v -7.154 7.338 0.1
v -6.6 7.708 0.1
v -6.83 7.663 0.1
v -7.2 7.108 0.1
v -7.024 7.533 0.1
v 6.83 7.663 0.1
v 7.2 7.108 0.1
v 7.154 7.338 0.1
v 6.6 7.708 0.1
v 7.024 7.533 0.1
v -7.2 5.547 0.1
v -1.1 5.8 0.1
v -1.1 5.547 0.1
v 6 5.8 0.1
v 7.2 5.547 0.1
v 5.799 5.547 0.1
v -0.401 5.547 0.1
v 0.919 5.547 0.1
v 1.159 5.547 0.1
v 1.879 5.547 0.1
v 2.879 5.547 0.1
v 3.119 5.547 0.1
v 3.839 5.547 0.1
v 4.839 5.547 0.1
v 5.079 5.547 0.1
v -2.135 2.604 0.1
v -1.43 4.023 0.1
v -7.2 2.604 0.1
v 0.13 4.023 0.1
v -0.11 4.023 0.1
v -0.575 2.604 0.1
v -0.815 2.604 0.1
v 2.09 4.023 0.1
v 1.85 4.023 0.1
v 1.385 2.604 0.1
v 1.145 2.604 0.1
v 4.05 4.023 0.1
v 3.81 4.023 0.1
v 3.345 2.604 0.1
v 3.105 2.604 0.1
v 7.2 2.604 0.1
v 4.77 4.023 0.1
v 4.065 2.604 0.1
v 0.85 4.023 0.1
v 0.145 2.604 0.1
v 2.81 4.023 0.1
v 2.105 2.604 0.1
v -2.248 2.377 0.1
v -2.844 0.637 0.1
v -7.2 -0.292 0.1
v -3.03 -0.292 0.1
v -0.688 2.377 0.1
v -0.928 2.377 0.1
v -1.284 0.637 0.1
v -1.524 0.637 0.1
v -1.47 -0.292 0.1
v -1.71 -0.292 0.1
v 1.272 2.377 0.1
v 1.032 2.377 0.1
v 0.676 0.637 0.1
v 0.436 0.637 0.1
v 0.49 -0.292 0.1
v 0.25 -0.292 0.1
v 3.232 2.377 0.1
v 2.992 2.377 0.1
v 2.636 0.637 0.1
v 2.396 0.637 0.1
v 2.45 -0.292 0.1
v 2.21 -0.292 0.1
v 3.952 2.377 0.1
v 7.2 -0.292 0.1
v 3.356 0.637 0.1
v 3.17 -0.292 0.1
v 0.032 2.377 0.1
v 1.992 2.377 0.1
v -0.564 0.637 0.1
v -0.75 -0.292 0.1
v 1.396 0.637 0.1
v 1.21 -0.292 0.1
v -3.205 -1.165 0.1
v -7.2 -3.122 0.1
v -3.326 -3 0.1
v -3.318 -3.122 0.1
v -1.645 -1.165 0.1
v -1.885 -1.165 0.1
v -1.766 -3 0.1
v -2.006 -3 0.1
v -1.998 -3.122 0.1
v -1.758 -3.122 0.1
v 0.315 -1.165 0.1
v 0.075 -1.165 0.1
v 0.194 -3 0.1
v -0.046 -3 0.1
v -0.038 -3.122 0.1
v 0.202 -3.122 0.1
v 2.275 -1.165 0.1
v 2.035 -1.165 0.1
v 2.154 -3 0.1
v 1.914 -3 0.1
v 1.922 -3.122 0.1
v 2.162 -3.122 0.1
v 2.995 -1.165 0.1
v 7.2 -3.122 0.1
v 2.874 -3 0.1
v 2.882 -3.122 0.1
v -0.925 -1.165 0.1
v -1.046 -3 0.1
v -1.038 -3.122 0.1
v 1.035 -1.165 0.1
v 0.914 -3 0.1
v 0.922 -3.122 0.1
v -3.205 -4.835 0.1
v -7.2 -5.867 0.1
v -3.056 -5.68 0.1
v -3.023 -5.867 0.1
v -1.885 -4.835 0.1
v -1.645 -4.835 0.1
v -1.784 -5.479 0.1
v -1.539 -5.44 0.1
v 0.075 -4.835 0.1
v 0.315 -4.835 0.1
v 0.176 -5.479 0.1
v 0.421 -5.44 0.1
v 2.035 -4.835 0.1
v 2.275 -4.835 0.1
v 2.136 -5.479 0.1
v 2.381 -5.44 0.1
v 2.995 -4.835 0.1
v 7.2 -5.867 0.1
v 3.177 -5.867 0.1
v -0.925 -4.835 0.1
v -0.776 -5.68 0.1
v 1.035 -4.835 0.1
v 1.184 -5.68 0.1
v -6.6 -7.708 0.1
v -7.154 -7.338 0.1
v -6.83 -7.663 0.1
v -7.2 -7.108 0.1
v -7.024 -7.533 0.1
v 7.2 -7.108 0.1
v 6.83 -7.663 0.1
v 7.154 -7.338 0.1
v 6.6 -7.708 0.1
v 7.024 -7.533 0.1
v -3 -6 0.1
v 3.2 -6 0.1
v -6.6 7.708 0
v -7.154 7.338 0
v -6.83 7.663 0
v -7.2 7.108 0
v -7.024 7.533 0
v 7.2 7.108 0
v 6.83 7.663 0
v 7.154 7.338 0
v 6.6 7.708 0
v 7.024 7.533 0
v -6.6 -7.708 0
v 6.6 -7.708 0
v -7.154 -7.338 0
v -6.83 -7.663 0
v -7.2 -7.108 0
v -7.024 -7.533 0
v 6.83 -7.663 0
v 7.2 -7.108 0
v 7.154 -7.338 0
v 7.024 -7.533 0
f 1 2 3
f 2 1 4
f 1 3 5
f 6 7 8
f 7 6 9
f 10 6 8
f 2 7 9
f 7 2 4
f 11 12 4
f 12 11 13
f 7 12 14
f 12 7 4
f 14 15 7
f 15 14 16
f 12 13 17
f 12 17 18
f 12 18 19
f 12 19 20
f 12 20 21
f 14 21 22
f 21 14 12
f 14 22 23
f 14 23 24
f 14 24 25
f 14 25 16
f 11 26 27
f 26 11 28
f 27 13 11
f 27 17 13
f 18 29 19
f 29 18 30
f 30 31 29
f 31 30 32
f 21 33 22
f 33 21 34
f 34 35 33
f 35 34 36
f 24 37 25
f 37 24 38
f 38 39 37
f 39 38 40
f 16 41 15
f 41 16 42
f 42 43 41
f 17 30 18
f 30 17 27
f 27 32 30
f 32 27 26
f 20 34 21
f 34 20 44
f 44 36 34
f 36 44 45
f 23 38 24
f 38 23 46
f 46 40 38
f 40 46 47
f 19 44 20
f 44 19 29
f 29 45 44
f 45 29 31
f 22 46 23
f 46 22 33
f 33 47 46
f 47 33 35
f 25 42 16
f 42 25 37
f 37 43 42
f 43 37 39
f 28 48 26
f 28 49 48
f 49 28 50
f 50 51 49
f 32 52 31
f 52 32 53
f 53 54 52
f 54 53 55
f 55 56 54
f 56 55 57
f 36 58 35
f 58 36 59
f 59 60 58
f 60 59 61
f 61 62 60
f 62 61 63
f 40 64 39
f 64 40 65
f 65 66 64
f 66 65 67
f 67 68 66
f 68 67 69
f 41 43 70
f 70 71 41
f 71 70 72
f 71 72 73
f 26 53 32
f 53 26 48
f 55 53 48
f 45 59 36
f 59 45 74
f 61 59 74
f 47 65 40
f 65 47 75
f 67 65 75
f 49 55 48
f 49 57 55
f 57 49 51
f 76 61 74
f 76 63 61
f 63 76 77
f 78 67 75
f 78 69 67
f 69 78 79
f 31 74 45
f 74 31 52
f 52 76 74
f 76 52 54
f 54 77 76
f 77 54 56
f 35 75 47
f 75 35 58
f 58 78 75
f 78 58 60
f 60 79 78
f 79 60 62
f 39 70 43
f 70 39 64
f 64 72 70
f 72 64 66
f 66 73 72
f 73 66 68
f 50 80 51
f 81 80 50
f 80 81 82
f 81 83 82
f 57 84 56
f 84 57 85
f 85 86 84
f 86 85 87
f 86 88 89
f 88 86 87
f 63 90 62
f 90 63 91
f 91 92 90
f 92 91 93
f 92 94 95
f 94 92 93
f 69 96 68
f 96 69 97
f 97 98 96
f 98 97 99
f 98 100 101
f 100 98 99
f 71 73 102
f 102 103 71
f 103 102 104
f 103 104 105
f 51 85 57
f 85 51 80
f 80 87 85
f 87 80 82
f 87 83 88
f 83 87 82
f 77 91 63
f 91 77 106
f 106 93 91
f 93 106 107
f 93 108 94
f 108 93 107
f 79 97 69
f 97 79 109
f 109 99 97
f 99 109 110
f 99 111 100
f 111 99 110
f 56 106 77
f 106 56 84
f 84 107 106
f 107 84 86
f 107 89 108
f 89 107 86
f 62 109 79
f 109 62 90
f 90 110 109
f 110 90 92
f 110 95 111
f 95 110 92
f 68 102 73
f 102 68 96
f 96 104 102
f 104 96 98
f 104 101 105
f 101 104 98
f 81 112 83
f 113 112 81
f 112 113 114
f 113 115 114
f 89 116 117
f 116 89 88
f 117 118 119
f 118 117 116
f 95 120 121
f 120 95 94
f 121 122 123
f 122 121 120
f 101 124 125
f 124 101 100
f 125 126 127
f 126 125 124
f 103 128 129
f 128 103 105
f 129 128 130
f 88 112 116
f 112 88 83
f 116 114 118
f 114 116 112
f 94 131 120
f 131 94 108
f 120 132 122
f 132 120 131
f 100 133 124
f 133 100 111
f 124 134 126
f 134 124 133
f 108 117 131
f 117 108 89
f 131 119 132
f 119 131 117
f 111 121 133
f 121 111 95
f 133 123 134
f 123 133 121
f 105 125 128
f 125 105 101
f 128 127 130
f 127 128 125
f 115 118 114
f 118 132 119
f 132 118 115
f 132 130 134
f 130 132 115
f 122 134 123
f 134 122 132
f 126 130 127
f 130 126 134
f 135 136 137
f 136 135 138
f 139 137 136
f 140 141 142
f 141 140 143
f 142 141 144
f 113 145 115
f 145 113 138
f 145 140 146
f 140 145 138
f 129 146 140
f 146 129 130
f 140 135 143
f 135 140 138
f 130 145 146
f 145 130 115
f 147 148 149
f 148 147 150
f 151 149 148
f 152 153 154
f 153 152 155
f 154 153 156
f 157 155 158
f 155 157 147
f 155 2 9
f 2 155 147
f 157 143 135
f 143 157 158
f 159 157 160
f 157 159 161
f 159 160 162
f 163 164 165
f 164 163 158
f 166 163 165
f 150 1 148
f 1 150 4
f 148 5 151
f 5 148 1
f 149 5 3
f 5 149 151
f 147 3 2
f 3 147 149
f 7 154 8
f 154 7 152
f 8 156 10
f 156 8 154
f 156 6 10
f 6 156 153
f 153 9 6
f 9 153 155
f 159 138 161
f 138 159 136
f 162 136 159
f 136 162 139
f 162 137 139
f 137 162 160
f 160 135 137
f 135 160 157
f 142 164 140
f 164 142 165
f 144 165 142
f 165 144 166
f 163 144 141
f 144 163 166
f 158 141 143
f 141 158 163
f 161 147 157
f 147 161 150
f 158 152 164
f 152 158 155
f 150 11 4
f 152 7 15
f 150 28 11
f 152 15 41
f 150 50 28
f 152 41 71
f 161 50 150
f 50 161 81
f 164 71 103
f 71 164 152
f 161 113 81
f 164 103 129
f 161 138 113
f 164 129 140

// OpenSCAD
// file: ../p/box3u12.scad
use <../lib.scad>
function ldraw_lib__box3u12() = [
// 0 Box with 3 Parallel Faces without Any Edges
// 0 Name: box3u12.dat
// 0 Author: J.C. Tchang [tchang]
// 0 !LDRAW_ORG Primitive UPDATE 2014-02
// 0 !LICENSE Licensed under CC BY 4.0 : see CAreadme.txt
// 
// 0 BFC CERTIFY CCW
  [0,"BFC","CERTIFY"],
  [0,"BFC","CCW"],
// 
// 0 !HISTORY 2014-12-23 [PTadmin] Official Update 2014-02
// 
// 
// 4 16 -1 1 1 1 1 1 1 1 -1 -1 1 -1
  [4,16,-1,1,1,1,1,1,1,1,-1,-1,1,-1],
// 4 16 -1 1 1 -1 0 1 1 0 1 1 1 1
  [4,16,-1,1,1,-1,0,1,1,0,1,1,1,1],
// 4 16 1 1 -1 1 0 -1 -1 0 -1 -1 1 -1
  [4,16,1,1,-1,1,0,-1,-1,0,-1,-1,1,-1],
];
module ldraw_lib__box3u12(step=0, col=false, unit=2/5, alt=false, line=0.2, solid=!$preview)
    makepoly(ldraw_lib__box3u12(), step=step, col=col, unit=unit, alt=alt, line=line, solid=solid);
ldraw_lib__box3u12(line=0.2);
// file: ../p/1-4cyli.scad
use <../lib.scad>
function ldraw_lib__1_4cyli() = [
// 0 Cylinder 0.25
// 0 Name: 1-4cyli.dat
// 0 Author: James Jessiman
// 0 !LDRAW_ORG Primitive UPDATE 2012-01
// 0 !LICENSE Licensed under CC BY 4.0 : see CAreadme.txt
// 
// 0 BFC CERTIFY CCW
  [0,"BFC","CERTIFY"],
  [0,"BFC","CCW"],
// 
// 0 !HISTORY 2002-03-23 [sbliss] Added BFC statement.
// 0 !HISTORY 2002-04-25 [PTadmin] Official Update 2002-02
// 0 !HISTORY 2007-06-22 [PTadmin] Header formatted for Contributor Agreement
// 0 !HISTORY 2008-07-01 [PTadmin] Official Update 2008-01
// 0 !HISTORY 2012-02-16 [Philo] Changed to CCW
// 0 !HISTORY 2012-03-30 [PTadmin] Official Update 2012-01
// 
// 
// 4 16 1 1 0 0.9239 1 0.3827 0.9239 0 0.3827 1 0 0
  [4,16,1,1,0,0.9239,1,0.3827,0.9239,0,0.3827,1,0,0],
// 5 24 1 0 0 1 1 0 0.9239 0 0.3827 1 0 -1
  [5,24,1,0,0,1,1,0,0.9239,0,0.3827,1,0,-1],
// 4 16 0.9239 1 0.3827 0.7071 1 0.7071 0.7071 0 0.7071 0.9239 0 0.3827
  [4,16,0.9239,1,0.3827,0.7071,1,0.7071,0.7071,0,0.7071,0.9239,0,0.3827],
// 5 24 0.9239 0 0.3827 0.9239 1 0.3827 0.7071 0 0.7071 1 0 0
  [5,24,0.9239,0,0.3827,0.9239,1,0.3827,0.7071,0,0.7071,1,0,0],
// 4 16 0.7071 1 0.7071 0.3827 1 0.9239 0.3827 0 0.9239 0.7071 0 0.7071
  [4,16,0.7071,1,0.7071,0.3827,1,0.9239,0.3827,0,0.9239,0.7071,0,0.7071],
// 5 24 0.7071 0 0.7071 0.7071 1 0.7071 0.3827 0 0.9239 0.9239 0 0.3827
  [5,24,0.7071,0,0.7071,0.7071,1,0.7071,0.3827,0,0.9239,0.9239,0,0.3827],
// 4 16 0.3827 1 0.9239 0 1 1 0 0 1 0.3827 0 0.9239
  [4,16,0.3827,1,0.9239,0,1,1,0,0,1,0.3827,0,0.9239],
// 5 24 0.3827 0 0.9239 0.3827 1 0.9239 0 0 1 0.7071 0 0.7071
  [5,24,0.3827,0,0.9239,0.3827,1,0.9239,0,0,1,0.7071,0,0.7071],
// 5 24 0 0 1 0 1 1 0.3827 0 0.9239 -1 0 1
  [5,24,0,0,1,0,1,1,0.3827,0,0.9239,-1,0,1],
];
module ldraw_lib__1_4cyli(step=0, col=false, unit=2/5, alt=false, line=0.2, solid=!$preview)
    makepoly(ldraw_lib__1_4cyli(), step=step, col=col, unit=unit, alt=alt, line=line, solid=solid);
ldraw_lib__1_4cyli(line=0.2);
// file: ../p/1-4chrd.scad
use <../lib.scad>
function ldraw_lib__1_4chrd() = [
// 0 Chord 0.25
// 0 Name: 1-4chrd.dat
// 0 Author: Max Martin Richter [MMR1988]
// 0 !LDRAW_ORG Primitive UPDATE 2023-05
// 0 !LICENSE Licensed under CC BY 4.0 : see CAreadme.txt
// 
// 0 BFC CERTIFY CCW
  [0,"BFC","CERTIFY"],
  [0,"BFC","CCW"],
// 
// 0 !HISTORY 2004-04-22 [PTadmin] Official Update 2004-02
// 0 !HISTORY 2007-10-09 [PTadmin] Header formatted for Contributor Agreement
// 0 !HISTORY 2008-07-01 [PTadmin] Official Update 2008-01
// 0 !HISTORY 2012-08-02 [MMR1988] Re-creation with PrimGen2 and Rectifier
// 0 !HISTORY 2012-08-09 [PTadmin] Official Update 2012-02
// 0 !HISTORY 2023-10-27 [OrionP] Change author to MMR1988 from hafhead
// 0 !HISTORY 2023-10-31 [OrionP] Official Update 2023-05
// 
// 4 16 0.9239 0 0.3827 0.3827 0 0.9239 0 0 1 1 0 0
  [4,16,0.9239,0,0.3827,0.3827,0,0.9239,0,0,1,1,0,0],
// 3 16 0.7071 0 0.7071 0.3827 0 0.9239 0.9239 0 0.3827
  [3,16,0.7071,0,0.7071,0.3827,0,0.9239,0.9239,0,0.3827],
];
module ldraw_lib__1_4chrd(step=0, col=false, unit=2/5, alt=false, line=0.2, solid=!$preview)
    makepoly(ldraw_lib__1_4chrd(), step=step, col=col, unit=unit, alt=alt, line=line, solid=solid);
ldraw_lib__1_4chrd(line=0.2);
// file: s/6142617ss07.scad
use <../../lib.scad>
use <../../p/1-4chrd.scad>
use <../../p/1-4cyli.scad>
use <../../p/box3u12.scad>
function ldraw_lib__s__6142617ss07() = [
// 0 ~Sticker  1.9 x  1.8 with Silver Air Vents on Black Background Left - Bottom Face
// 0 Name: s\6142617ss07.dat
// 0 Author: Massimo Maso [Sirio]
// 0 !LDRAW_ORG Subpart UPDATE 2023-05
// 0 !LICENSE Licensed under CC BY 4.0 : see CAreadme.txt
// 
// 0 BFC CERTIFY CCW
  [0,"BFC","CERTIFY"],
  [0,"BFC","CCW"],
// 
// 0 !HISTORY 2023-10-31 [OrionP] Official Update 2023-05
// 
// 
// 0 // Primitives
// 1 16 -16.5 0 17.7711 -1.5 0 0 0 -1 0 0 0 1.5 1-4chrd.dat
  [1,16,-16.5,0,17.7711,-1.5,0,0,0,-1,0,0,0,1.5, ldraw_lib__1_4chrd()],
// 1 16 16.5 0 17.7711 1.5 0 0 0 -1 0 0 0 1.5 1-4chrd.dat
  [1,16,16.5,0,17.7711,1.5,0,0,0,-1,0,0,0,1.5, ldraw_lib__1_4chrd()],
// 1 16 0 -.25 0 16.5 0 0 0 .25 0 0 0 19.2711 box3u12.dat
  [1,16,0,-.25,0,16.5,0,0,0,.25,0,0,0,19.2711, ldraw_lib__box3u12()],
// 1 16 -16.5 0 -17.7711 -1.5 0 0 0 -1 0 0 0 -1.5 1-4chrd.dat
  [1,16,-16.5,0,-17.7711,-1.5,0,0,0,-1,0,0,0,-1.5, ldraw_lib__1_4chrd()],
// 1 16 16.5 0 -17.7711 1.5 0 0 0 -1 0 0 0 -1.5 1-4chrd.dat
  [1,16,16.5,0,-17.7711,1.5,0,0,0,-1,0,0,0,-1.5, ldraw_lib__1_4chrd()],
// 1 16 -16.5 -0.25 17.7711 -1.5 0 0 0 0.25 0 0 0 1.5 1-4cyli.dat
  [1,16,-16.5,-0.25,17.7711,-1.5,0,0,0,0.25,0,0,0,1.5, ldraw_lib__1_4cyli()],
// 1 16 16.5 -0.25 17.7711 1.5 0 0 0 0.25 0 0 0 1.5 1-4cyli.dat
  [1,16,16.5,-0.25,17.7711,1.5,0,0,0,0.25,0,0,0,1.5, ldraw_lib__1_4cyli()],
// 1 16 -16.5 -0.25 -17.7711 -1.5 0 0 0 0.25 0 0 0 -1.5 1-4cyli.dat
  [1,16,-16.5,-0.25,-17.7711,-1.5,0,0,0,0.25,0,0,0,-1.5, ldraw_lib__1_4cyli()],
// 1 16 16.5 -0.25 -17.7711 1.5 0 0 0 0.25 0 0 0 -1.5 1-4cyli.dat
  [1,16,16.5,-0.25,-17.7711,1.5,0,0,0,0.25,0,0,0,-1.5, ldraw_lib__1_4cyli()],
// 0 // Bottom face
// 4 16 -16.5 0 19.2711 -16.5 0 -19.2711 -18 0 -17.7711 -18 0 17.7711
  [4,16,-16.5,0,19.2711,-16.5,0,-19.2711,-18,0,-17.7711,-18,0,17.7711],
// 4 16 16.5 0 19.2711 18 0 17.7711 18 0 -17.7711 16.5 0 -19.2711
  [4,16,16.5,0,19.2711,18,0,17.7711,18,0,-17.7711,16.5,0,-19.2711],
// 0 // Lateral face
// 3 16 -18 0 17.7711 -18 -.25 13.8668 -18 -.25 17.7711
  [3,16,-18,0,17.7711,-18,-.25,13.8668,-18,-.25,17.7711],
// 3 16 18 0 17.7711 18 -.25 17.7711 18 -.25 13.8668
  [3,16,18,0,17.7711,18,-.25,17.7711,18,-.25,13.8668],
// 3 16 -18 0 17.7711 -18 -.25 6.5112 -18 -.25 13.8668
  [3,16,-18,0,17.7711,-18,-.25,6.5112,-18,-.25,13.8668],
// 3 16 18 0 17.7711 18 -.25 13.8668 18 -.25 6.5112
  [3,16,18,0,17.7711,18,-.25,13.8668,18,-.25,6.5112],
// 3 16 -18 0 17.7711 -18 -.25 -.73 -18 -.25 6.5112
  [3,16,-18,0,17.7711,-18,-.25,-.73,-18,-.25,6.5112],
// 3 16 18 0 17.7711 18 -.25 6.5112 18 -.25 -.73
  [3,16,18,0,17.7711,18,-.25,6.5112,18,-.25,-.73],
// 4 16 -18 0 17.7711 -18 0 -17.7711 -18 -.25 -7.8038 -18 -.25 -.73
  [4,16,-18,0,17.7711,-18,0,-17.7711,-18,-.25,-7.8038,-18,-.25,-.73],
// 4 16 18 0 17.7711 18 -.25 -.73 18 -.25 -7.8038 18 0 -17.7711
  [4,16,18,0,17.7711,18,-.25,-.73,18,-.25,-7.8038,18,0,-17.7711],
// 3 16 -18 0 -17.7711 -18 -.25 -14.6666 -18 -.25 -7.8038
  [3,16,-18,0,-17.7711,-18,-.25,-14.6666,-18,-.25,-7.8038],
// 3 16 18 0 -17.7711 18 -.25 -7.8038 18 -.25 -14.6666
  [3,16,18,0,-17.7711,18,-.25,-7.8038,18,-.25,-14.6666],
// 3 16 -18 0 -17.7711 -18 -.25 -17.7711 -18 -.25 -14.6666
  [3,16,-18,0,-17.7711,-18,-.25,-17.7711,-18,-.25,-14.6666],
// 3 16 18 0 -17.7711 18 -.25 -14.6666 18 -.25 -17.7711
  [3,16,18,0,-17.7711,18,-.25,-14.6666,18,-.25,-17.7711],
];
module ldraw_lib__s__6142617ss07(step=0, col=false, unit=2/5, alt=false, line=0.2, solid=!$preview)
    makepoly(ldraw_lib__s__6142617ss07(), step=step, col=col, unit=unit, alt=alt, line=line, solid=solid);
ldraw_lib__s__6142617ss07(line=0.2);
// file: s/6142617ss06.scad
use <../../lib.scad>
use <../../p/1-4chrd.scad>
function ldraw_lib__s__6142617ss06() = [
// 0 ~Sticker  1.9 x  1.8 with Silver Air Vents on Black Background Left - Sixth Face
// 0 Name: s\6142617ss06.dat
// 0 Author: Massimo Maso [Sirio]
// 0 !LDRAW_ORG Subpart UPDATE 2023-05
// 0 !LICENSE Licensed under CC BY 4.0 : see CAreadme.txt
// 
// 0 BFC CERTIFY CCW
  [0,"BFC","CERTIFY"],
  [0,"BFC","CCW"],
// 
// 0 !HISTORY 2023-10-31 [OrionP] Official Update 2023-05
// 
// 
// 0 // Primitives
// 1 0 -16.5 -.25 -3.0901 -1.5 0 0 0 1 0 0 0 -1.5 1-4chrd.dat
  [1,0,-16.5,-.25,-3.0901,-1.5,0,0,0,1,0,0,0,-1.5, ldraw_lib__1_4chrd()],
// 1 0 16.5 -.25 -3.0901 1.5 0 0 0 1 0 0 0 -1.5 1-4chrd.dat
  [1,0,16.5,-.25,-3.0901,1.5,0,0,0,1,0,0,0,-1.5, ldraw_lib__1_4chrd()],
// 0 // Black faces
// 4 0 -18 -.25 -3.0901 -7.5 -.25 -.319 -7.5587 -.25 .0144 -18 -.25 .0144
  [4,0,-18,-.25,-3.0901,-7.5,-.25,-.319,-7.5587,-.25,.0144,-18,-.25,.0144],
// 4 0 -18 -.25 -3.0901 18 -.25 -3.0901 8 -.25 -.319 -7.5 -.25 -.319
  [4,0,-18,-.25,-3.0901,18,-.25,-3.0901,8,-.25,-.319,-7.5,-.25,-.319],
// 4 0 18 -.25 -3.0901 18 -.25 .0144 7.9413 -.25 .0144 8 -.25 -.319
  [4,0,18,-.25,-3.0901,18,-.25,.0144,7.9413,-.25,.0144,8,-.25,-.319],
// 4 0 18 -.25 -3.0901 -18 -.25 -3.0901 -16.5 -.25 -4.5901 16.5 -.25 -4.5901
  [4,0,18,-.25,-3.0901,-18,-.25,-3.0901,-16.5,-.25,-4.5901,16.5,-.25,-4.5901],
// 0 // Silver face
// 4 80 -7.5587 -.25 .0144 -7.5 -.25 -.319 8 -.25 -.319 7.9413 -.25 .0144
  [4,80,-7.5587,-.25,.0144,-7.5,-.25,-.319,8,-.25,-.319,7.9413,-.25,.0144],
];
module ldraw_lib__s__6142617ss06(step=0, col=false, unit=2/5, alt=false, line=0.2, solid=!$preview)
    makepoly(ldraw_lib__s__6142617ss06(), step=step, col=col, unit=unit, alt=alt, line=line, solid=solid);
ldraw_lib__s__6142617ss06(line=0.2);
// file: s/6142617ss05.scad
use <../../lib.scad>
function ldraw_lib__s__6142617ss05() = [
// 0 ~Sticker  1.9 x  1.8 with Silver Air Vents on Black Background Left - Fifth Face
// 0 Name: s\6142617ss05.dat
// 0 Author: Massimo Maso [Sirio]
// 0 !LDRAW_ORG Subpart UPDATE 2023-05
// 0 !LICENSE Licensed under CC BY 4.0 : see CAreadme.txt
// 
// 0 BFC CERTIFY CCW
  [0,"BFC","CERTIFY"],
  [0,"BFC","CCW"],
// 
// 0 !HISTORY 2023-10-31 [OrionP] Official Update 2023-05
// 
// 
// 0 // Black faces
// 3 0 -18 -.25 6.8484 -8.0132 -.25 2.5659 -8.2961 -.25 6.8484
  [3,0,-18,-.25,6.8484,-8.0132,-.25,2.5659,-8.2961,-.25,6.8484],
// 4 0 -18 -.25 6.8484 -18 -.25 -.0144 -7.6409 -.25 .4522 -8.0132 -.25 2.5659
  [4,0,-18,-.25,6.8484,-18,-.25,-.0144,-7.6409,-.25,.4522,-8.0132,-.25,2.5659],
// 3 0 -18 -.25 -.0144 -7.5587 -.25 -.0144 -7.6409 -.25 .4522
  [3,0,-18,-.25,-.0144,-7.5587,-.25,-.0144,-7.6409,-.25,.4522],
// 4 0 -4.7132 -.25 2.5659 -4.1132 -.25 2.5659 -4.3961 -.25 6.8484 -4.9961 -.25 6.8484
  [4,0,-4.7132,-.25,2.5659,-4.1132,-.25,2.5659,-4.3961,-.25,6.8484,-4.9961,-.25,6.8484],
// 4 0 -4.7132 -.25 2.5659 -4.461 -.25 .955 -3.8466 -.25 1.0522 -4.1132 -.25 2.5659
  [4,0,-4.7132,-.25,2.5659,-4.461,-.25,.955,-3.8466,-.25,1.0522,-4.1132,-.25,2.5659],
// 4 0 .1868 -.25 2.5659 .7868 -.25 2.5659 .5039 -.25 6.8484 -.0961 -.25 6.8484
  [4,0,.1868,-.25,2.5659,.7868,-.25,2.5659,.5039,-.25,6.8484,-.0961,-.25,6.8484],
// 4 0 .1868 -.25 2.5659 .439 -.25 .955 1.0534 -.25 1.0522 .7868 -.25 2.5659
  [4,0,.1868,-.25,2.5659,.439,-.25,.955,1.0534,-.25,1.0522,.7868,-.25,2.5659],
// 4 0 5.0868 -.25 2.5659 5.6868 -.25 2.5659 5.4039 -.25 6.8484 4.8039 -.25 6.8484
  [4,0,5.0868,-.25,2.5659,5.6868,-.25,2.5659,5.4039,-.25,6.8484,4.8039,-.25,6.8484],
// 4 0 5.0868 -.25 2.5659 5.339 -.25 .955 5.9534 -.25 1.0522 5.6868 -.25 2.5659
  [4,0,5.0868,-.25,2.5659,5.339,-.25,.955,5.9534,-.25,1.0522,5.6868,-.25,2.5659],
// 4 0 18 -.25 -.0144 18 -.25 6.8484 7.2039 -.25 6.8484 7.4868 -.25 2.5659
  [4,0,18,-.25,-.0144,18,-.25,6.8484,7.2039,-.25,6.8484,7.4868,-.25,2.5659],
// 3 0 18 -.25 -.0144 7.4868 -.25 2.5659 7.9413 -.25 -.0144
  [3,0,18,-.25,-.0144,7.4868,-.25,2.5659,7.9413,-.25,-.0144],
// 0 // Grey faces
// 4 71 -8.0132 -.25 2.5659 -4.7132 -.25 2.5659 -4.9961 -.25 6.8484 -8.2961 -.25 6.8484
  [4,71,-8.0132,-.25,2.5659,-4.7132,-.25,2.5659,-4.9961,-.25,6.8484,-8.2961,-.25,6.8484],
// 4 71 -8.0132 -.25 2.5659 -7.6409 -.25 .4522 -4.461 -.25 .955 -4.7132 -.25 2.5659
  [4,71,-8.0132,-.25,2.5659,-7.6409,-.25,.4522,-4.461,-.25,.955,-4.7132,-.25,2.5659],
// 4 71 -2.3132 -.25 2.5659 .1868 -.25 2.5659 -.0961 -.25 6.8484 -2.5961 -.25 6.8484
  [4,71,-2.3132,-.25,2.5659,.1868,-.25,2.5659,-.0961,-.25,6.8484,-2.5961,-.25,6.8484],
// 4 71 -2.3132 -.25 2.5659 -1.9409 -.25 .4522 .439 -.25 .955 .1868 -.25 2.5659
  [4,71,-2.3132,-.25,2.5659,-1.9409,-.25,.4522,.439,-.25,.955,.1868,-.25,2.5659],
// 4 71 2.5868 -.25 2.5659 5.0868 -.25 2.5659 4.8039 -.25 6.8484 2.3039 -.25 6.8484
  [4,71,2.5868,-.25,2.5659,5.0868,-.25,2.5659,4.8039,-.25,6.8484,2.3039,-.25,6.8484],
// 4 71 2.5868 -.25 2.5659 2.9591 -.25 .4522 5.339 -.25 .955 5.0868 -.25 2.5659
  [4,71,2.5868,-.25,2.5659,2.9591,-.25,.4522,5.339,-.25,.955,5.0868,-.25,2.5659],
// 0 // Silver faces
// 4 80 -4.1132 -.25 2.5659 -2.3132 -.25 2.5659 -2.5961 -.25 6.8484 -4.3961 -.25 6.8484
  [4,80,-4.1132,-.25,2.5659,-2.3132,-.25,2.5659,-2.5961,-.25,6.8484,-4.3961,-.25,6.8484],
// 4 80 -4.1132 -.25 2.5659 -3.8466 -.25 1.0522 -1.9409 -.25 .4522 -2.3132 -.25 2.5659
  [4,80,-4.1132,-.25,2.5659,-3.8466,-.25,1.0522,-1.9409,-.25,.4522,-2.3132,-.25,2.5659],
// 4 80 .7868 -.25 2.5659 2.5868 -.25 2.5659 2.3039 -.25 6.8484 .5039 -.25 6.8484
  [4,80,.7868,-.25,2.5659,2.5868,-.25,2.5659,2.3039,-.25,6.8484,.5039,-.25,6.8484],
// 4 80 .7868 -.25 2.5659 1.0534 -.25 1.0522 2.9591 -.25 .4522 2.5868 -.25 2.5659
  [4,80,.7868,-.25,2.5659,1.0534,-.25,1.0522,2.9591,-.25,.4522,2.5868,-.25,2.5659],
// 4 80 5.6868 -.25 2.5659 7.4868 -.25 2.5659 7.2039 -.25 6.8484 5.4039 -.25 6.8484
  [4,80,5.6868,-.25,2.5659,7.4868,-.25,2.5659,7.2039,-.25,6.8484,5.4039,-.25,6.8484],
// 4 80 5.6868 -.25 2.5659 5.9534 -.25 1.0522 7.9413 -.25 -.0144 7.4868 -.25 2.5659
  [4,80,5.6868,-.25,2.5659,5.9534,-.25,1.0522,7.9413,-.25,-.0144,7.4868,-.25,2.5659],
// 3 80 -7.5587 -.25 -.0144 -4.461 -.25 .955 -7.6409 -.25 .4522
  [3,80,-7.5587,-.25,-.0144,-4.461,-.25,.955,-7.6409,-.25,.4522],
// 4 80 -7.5587 -.25 -.0144 -1.9409 -.25 .4522 -3.8466 -.25 1.0522 -4.461 -.25 .955
  [4,80,-7.5587,-.25,-.0144,-1.9409,-.25,.4522,-3.8466,-.25,1.0522,-4.461,-.25,.955],
// 4 80 -7.5587 -.25 -.0144 7.9413 -.25 -.0144 2.9591 -.25 .4522 -1.9409 -.25 .4522
  [4,80,-7.5587,-.25,-.0144,7.9413,-.25,-.0144,2.9591,-.25,.4522,-1.9409,-.25,.4522],
// 4 80 2.9591 -.25 .4522 1.0534 -.25 1.0522 .439 -.25 .955 -1.9409 -.25 .4522
  [4,80,2.9591,-.25,.4522,1.0534,-.25,1.0522,.439,-.25,.955,-1.9409,-.25,.4522],
// 4 80 2.9591 -.25 .4522 7.9413 -.25 -.0144 5.9534 -.25 1.0522 5.339 -.25 .955
  [4,80,2.9591,-.25,.4522,7.9413,-.25,-.0144,5.9534,-.25,1.0522,5.339,-.25,.955],
];
module ldraw_lib__s__6142617ss05(step=0, col=false, unit=2/5, alt=false, line=0.2, solid=!$preview)
    makepoly(ldraw_lib__s__6142617ss05(), step=step, col=col, unit=unit, alt=alt, line=line, solid=solid);
ldraw_lib__s__6142617ss05(line=0.2);
// file: s/6142617ss04.scad
use <../../lib.scad>
function ldraw_lib__s__6142617ss04() = [
// 0 ~Sticker  1.9 x  1.8 with Silver Air Vents on Black Background Left - Fourth Face
// 0 Name: s\6142617ss04.dat
// 0 Author: Massimo Maso [Sirio]
// 0 !LDRAW_ORG Subpart UPDATE 2023-05
// 0 !LICENSE Licensed under CC BY 4.0 : see CAreadme.txt
// 
// 0 BFC CERTIFY CCW
  [0,"BFC","CERTIFY"],
  [0,"BFC","CCW"],
// 
// 0 !HISTORY 2023-10-31 [OrionP] Official Update 2023-05
// 
// 
// 0 // Black faces
// 3 0 -18 -.25 .0128 -8.0132 -.25 -2.1709 -7.5754 -.25 .0128
  [3,0,-18,-.25,.0128,-8.0132,-.25,-2.1709,-7.5754,-.25,.0128],
// 4 0 -18 -.25 .0128 -18 -.25 -7.061 -8.3161 -.25 -6.7572 -8.0132 -.25 -2.1709
  [4,0,-18,-.25,.0128,-18,-.25,-7.061,-8.3161,-.25,-6.7572,-8.0132,-.25,-2.1709],
// 3 0 -18 -.25 -7.061 -8.2961 -.25 -7.061 -8.3161 -.25 -6.7572
  [3,0,-18,-.25,-7.061,-8.2961,-.25,-7.061,-8.3161,-.25,-6.7572],
// 4 0 -4.7132 -.25 -2.1709 -4.1132 -.25 -2.1709 -3.6754 -.25 .0128 -4.2754 -.25 .0128
  [4,0,-4.7132,-.25,-2.1709,-4.1132,-.25,-2.1709,-3.6754,-.25,.0128,-4.2754,-.25,.0128],
// 4 0 -4.7132 -.25 -2.1709 -5.0161 -.25 -6.7572 -4.4161 -.25 -6.7572 -4.1132 -.25 -2.1709
  [4,0,-4.7132,-.25,-2.1709,-5.0161,-.25,-6.7572,-4.4161,-.25,-6.7572,-4.1132,-.25,-2.1709],
// 4 0 -5.0161 -.25 -6.7572 -4.9961 -.25 -7.061 -4.3961 -.25 -7.061 -4.4161 -.25 -6.7572
  [4,0,-5.0161,-.25,-6.7572,-4.9961,-.25,-7.061,-4.3961,-.25,-7.061,-4.4161,-.25,-6.7572],
// 4 0 .1868 -.25 -2.1709 .7868 -.25 -2.1709 1.2246 -.25 .0128 .6246 -.25 .0128
  [4,0,.1868,-.25,-2.1709,.7868,-.25,-2.1709,1.2246,-.25,.0128,.6246,-.25,.0128],
// 4 0 .1868 -.25 -2.1709 -.1161 -.25 -6.7572 .4839 -.25 -6.7572 .7868 -.25 -2.1709
  [4,0,.1868,-.25,-2.1709,-.1161,-.25,-6.7572,.4839,-.25,-6.7572,.7868,-.25,-2.1709],
// 4 0 -.1161 -.25 -6.7572 -.0961 -.25 -7.061 .5039 -.25 -7.061 .4839 -.25 -6.7572
  [4,0,-.1161,-.25,-6.7572,-.0961,-.25,-7.061,.5039,-.25,-7.061,.4839,-.25,-6.7572],
// 4 0 5.0868 -.25 -2.1709 5.6868 -.25 -2.1709 6.1246 -.25 .0128 5.5246 -.25 .0128
  [4,0,5.0868,-.25,-2.1709,5.6868,-.25,-2.1709,6.1246,-.25,.0128,5.5246,-.25,.0128],
// 4 0 5.0868 -.25 -2.1709 4.7839 -.25 -6.7572 5.3839 -.25 -6.7572 5.6868 -.25 -2.1709
  [4,0,5.0868,-.25,-2.1709,4.7839,-.25,-6.7572,5.3839,-.25,-6.7572,5.6868,-.25,-2.1709],
// 4 0 4.7839 -.25 -6.7572 4.8039 -.25 -7.061 5.4039 -.25 -7.061 5.3839 -.25 -6.7572
  [4,0,4.7839,-.25,-6.7572,4.8039,-.25,-7.061,5.4039,-.25,-7.061,5.3839,-.25,-6.7572],
// 3 0 18 -.25 .0128 7.9246 -.25 .0128 7.4868 -.25 -2.1709
  [3,0,18,-.25,.0128,7.9246,-.25,.0128,7.4868,-.25,-2.1709],
// 4 0 18 -.25 -7.061 18 -.25 .0128 7.4868 -.25 -2.1709 7.1839 -.25 -6.7572
  [4,0,18,-.25,-7.061,18,-.25,.0128,7.4868,-.25,-2.1709,7.1839,-.25,-6.7572],
// 3 0 18 -.25 -7.061 7.1839 -.25 -6.7572 7.2039 -.25 -7.061
  [3,0,18,-.25,-7.061,7.1839,-.25,-6.7572,7.2039,-.25,-7.061],
// 0 // Grey faces
// 4 71 -8.0132 -.25 -2.1709 -4.7132 -.25 -2.1709 -4.2754 -.25 .0128 -7.5754 -.25 .0128
  [4,71,-8.0132,-.25,-2.1709,-4.7132,-.25,-2.1709,-4.2754,-.25,.0128,-7.5754,-.25,.0128],
// 4 71 -8.0132 -.25 -2.1709 -8.3161 -.25 -6.7572 -5.0161 -.25 -6.7572 -4.7132 -.25 -2.1709
  [4,71,-8.0132,-.25,-2.1709,-8.3161,-.25,-6.7572,-5.0161,-.25,-6.7572,-4.7132,-.25,-2.1709],
// 4 71 -8.3161 -.25 -6.7572 -8.2961 -.25 -7.061 -4.9961 -.25 -7.061 -5.0161 -.25 -6.7572
  [4,71,-8.3161,-.25,-6.7572,-8.2961,-.25,-7.061,-4.9961,-.25,-7.061,-5.0161,-.25,-6.7572],
// 4 71 -2.3132 -.25 -2.1709 .1868 -.25 -2.1709 .6246 -.25 .0128 -1.8754 -.25 .0128
  [4,71,-2.3132,-.25,-2.1709,.1868,-.25,-2.1709,.6246,-.25,.0128,-1.8754,-.25,.0128],
// 4 71 -2.3132 -.25 -2.1709 -2.6161 -.25 -6.7572 -.1161 -.25 -6.7572 .1868 -.25 -2.1709
  [4,71,-2.3132,-.25,-2.1709,-2.6161,-.25,-6.7572,-.1161,-.25,-6.7572,.1868,-.25,-2.1709],
// 4 71 -2.6161 -.25 -6.7572 -2.5961 -.25 -7.061 -.0961 -.25 -7.061 -.1161 -.25 -6.7572
  [4,71,-2.6161,-.25,-6.7572,-2.5961,-.25,-7.061,-.0961,-.25,-7.061,-.1161,-.25,-6.7572],
// 4 71 2.5868 -.25 -2.1709 5.0868 -.25 -2.1709 5.5246 -.25 .0128 3.0246 -.25 .0128
  [4,71,2.5868,-.25,-2.1709,5.0868,-.25,-2.1709,5.5246,-.25,.0128,3.0246,-.25,.0128],
// 4 71 2.5868 -.25 -2.1709 2.2839 -.25 -6.7572 4.7839 -.25 -6.7572 5.0868 -.25 -2.1709
  [4,71,2.5868,-.25,-2.1709,2.2839,-.25,-6.7572,4.7839,-.25,-6.7572,5.0868,-.25,-2.1709],
// 4 71 2.2839 -.25 -6.7572 2.3039 -.25 -7.061 4.8039 -.25 -7.061 4.7839 -.25 -6.7572
  [4,71,2.2839,-.25,-6.7572,2.3039,-.25,-7.061,4.8039,-.25,-7.061,4.7839,-.25,-6.7572],
// 0 // Silver faces
// 4 80 -4.1132 -.25 -2.1709 -2.3132 -.25 -2.1709 -1.8754 -.25 .0128 -3.6754 -.25 .0128
  [4,80,-4.1132,-.25,-2.1709,-2.3132,-.25,-2.1709,-1.8754,-.25,.0128,-3.6754,-.25,.0128],
// 4 80 -4.1132 -.25 -2.1709 -4.4161 -.25 -6.7572 -2.6161 -.25 -6.7572 -2.3132 -.25 -2.1709
  [4,80,-4.1132,-.25,-2.1709,-4.4161,-.25,-6.7572,-2.6161,-.25,-6.7572,-2.3132,-.25,-2.1709],
// 4 80 -4.4161 -.25 -6.7572 -4.3961 -.25 -7.061 -2.5961 -.25 -7.061 -2.6161 -.25 -6.7572
  [4,80,-4.4161,-.25,-6.7572,-4.3961,-.25,-7.061,-2.5961,-.25,-7.061,-2.6161,-.25,-6.7572],
// 4 80 .7868 -.25 -2.1709 2.5868 -.25 -2.1709 3.0246 -.25 .0128 1.2246 -.25 .0128
  [4,80,.7868,-.25,-2.1709,2.5868,-.25,-2.1709,3.0246,-.25,.0128,1.2246,-.25,.0128],
// 4 80 .7868 -.25 -2.1709 .4839 -.25 -6.7572 2.2839 -.25 -6.7572 2.5868 -.25 -2.1709
  [4,80,.7868,-.25,-2.1709,.4839,-.25,-6.7572,2.2839,-.25,-6.7572,2.5868,-.25,-2.1709],
// 4 80 .4839 -.25 -6.7572 .5039 -.25 -7.061 2.3039 -.25 -7.061 2.2839 -.25 -6.7572
  [4,80,.4839,-.25,-6.7572,.5039,-.25,-7.061,2.3039,-.25,-7.061,2.2839,-.25,-6.7572],
// 4 80 5.6868 -.25 -2.1709 7.4868 -.25 -2.1709 7.9246 -.25 .0128 6.1246 -.25 .0128
  [4,80,5.6868,-.25,-2.1709,7.4868,-.25,-2.1709,7.9246,-.25,.0128,6.1246,-.25,.0128],
// 4 80 5.6868 -.25 -2.1709 5.3839 -.25 -6.7572 7.1839 -.25 -6.7572 7.4868 -.25 -2.1709
  [4,80,5.6868,-.25,-2.1709,5.3839,-.25,-6.7572,7.1839,-.25,-6.7572,7.4868,-.25,-2.1709],
// 4 80 5.3839 -.25 -6.7572 5.4039 -.25 -7.061 7.2039 -.25 -7.061 7.1839 -.25 -6.7572
  [4,80,5.3839,-.25,-6.7572,5.4039,-.25,-7.061,7.2039,-.25,-7.061,7.1839,-.25,-6.7572],
];
module ldraw_lib__s__6142617ss04(step=0, col=false, unit=2/5, alt=false, line=0.2, solid=!$preview)
    makepoly(ldraw_lib__s__6142617ss04(), step=step, col=col, unit=unit, alt=alt, line=line, solid=solid);
ldraw_lib__s__6142617ss04(line=0.2);
// file: s/6142617ss03.scad
use <../../lib.scad>
function ldraw_lib__s__6142617ss03() = [
// 0 ~Sticker  1.9 x  1.8 with Silver Air Vents on Black Background Left - Third Face
// 0 Name: s\6142617ss03.dat
// 0 Author: Massimo Maso [Sirio]
// 0 !LDRAW_ORG Subpart UPDATE 2023-05
// 0 !LICENSE Licensed under CC BY 4.0 : see CAreadme.txt
// 
// 0 BFC CERTIFY CCW
  [0,"BFC","CERTIFY"],
  [0,"BFC","CCW"],
// 
// 0 !HISTORY 2023-10-31 [OrionP] Official Update 2023-05
// 
// 
// 0 // Black faces
// 3 0 -18 -.25 7.2284 -5.6212 -.25 6.6588 -5.3378 -.25 7.2284
  [3,0,-18,-.25,7.2284,-5.6212,-.25,6.6588,-5.3378,-.25,7.2284],
// 4 0 -18 -.25 7.2284 -18 -.25 -.0128 -7.1097 -.25 2.3102 -5.6212 -.25 6.6588
  [4,0,-18,-.25,7.2284,-18,-.25,-.0128,-7.1097,-.25,2.3102,-5.6212,-.25,6.6588],
// 3 0 -18 -.25 -.0128 -7.5754 -.25 -.0128 -7.1097 -.25 2.3102
  [3,0,-18,-.25,-.0128,-7.5754,-.25,-.0128,-7.1097,-.25,2.3102],
// 4 0 -2.3212 -.25 6.6588 -1.7212 -.25 6.6588 -1.4378 -.25 7.2284 -2.0378 -.25 7.2284
  [4,0,-2.3212,-.25,6.6588,-1.7212,-.25,6.6588,-1.4378,-.25,7.2284,-2.0378,-.25,7.2284],
// 4 0 -2.3212 -.25 6.6588 -3.8097 -.25 2.3102 -3.2097 -.25 2.3102 -1.7212 -.25 6.6588
  [4,0,-2.3212,-.25,6.6588,-3.8097,-.25,2.3102,-3.2097,-.25,2.3102,-1.7212,-.25,6.6588],
// 4 0 -3.8097 -.25 2.3102 -4.2754 -.25 -.0128 -3.6754 -.25 -.0128 -3.2097 -.25 2.3102
  [4,0,-3.8097,-.25,2.3102,-4.2754,-.25,-.0128,-3.6754,-.25,-.0128,-3.2097,-.25,2.3102],
// 4 0 2.5788 -.25 6.6588 3.1788 -.25 6.6588 3.4622 -.25 7.2284 2.8622 -.25 7.2284
  [4,0,2.5788,-.25,6.6588,3.1788,-.25,6.6588,3.4622,-.25,7.2284,2.8622,-.25,7.2284],
// 4 0 2.5788 -.25 6.6588 1.0903 -.25 2.3102 1.6903 -.25 2.3102 3.1788 -.25 6.6588
  [4,0,2.5788,-.25,6.6588,1.0903,-.25,2.3102,1.6903,-.25,2.3102,3.1788,-.25,6.6588],
// 4 0 1.0903 -.25 2.3102 .6246 -.25 -.0128 1.2246 -.25 -.0128 1.6903 -.25 2.3102
  [4,0,1.0903,-.25,2.3102,.6246,-.25,-.0128,1.2246,-.25,-.0128,1.6903,-.25,2.3102],
// 4 0 7.4788 -.25 6.6588 8.0788 -.25 6.6588 8.3622 -.25 7.2284 7.7622 -.25 7.2284
  [4,0,7.4788,-.25,6.6588,8.0788,-.25,6.6588,8.3622,-.25,7.2284,7.7622,-.25,7.2284],
// 4 0 7.4788 -.25 6.6588 5.9903 -.25 2.3102 6.5903 -.25 2.3102 8.0788 -.25 6.6588
  [4,0,7.4788,-.25,6.6588,5.9903,-.25,2.3102,6.5903,-.25,2.3102,8.0788,-.25,6.6588],
// 4 0 5.9903 -.25 2.3102 5.5246 -.25 -.0128 6.1246 -.25 -.0128 6.5903 -.25 2.3102
  [4,0,5.9903,-.25,2.3102,5.5246,-.25,-.0128,6.1246,-.25,-.0128,6.5903,-.25,2.3102],
// 3 0 18 -.25 7.2284 10.1622 -.25 7.2284 9.8788 -.25 6.6588
  [3,0,18,-.25,7.2284,10.1622,-.25,7.2284,9.8788,-.25,6.6588],
// 4 0 18 -.25 -.0128 18 -.25 7.2284 9.8788 -.25 6.6588 8.3903 -.25 2.3102
  [4,0,18,-.25,-.0128,18,-.25,7.2284,9.8788,-.25,6.6588,8.3903,-.25,2.3102],
// 3 0 18 -.25 -.0128 8.3903 -.25 2.3102 7.9246 -.25 -.0128
  [3,0,18,-.25,-.0128,8.3903,-.25,2.3102,7.9246,-.25,-.0128],
// 0 // Dark grey faces
// 4 72 -5.6212 -.25 6.6588 -2.3212 -.25 6.6588 -2.0378 -.25 7.2284 -5.3378 -.25 7.2284
  [4,72,-5.6212,-.25,6.6588,-2.3212,-.25,6.6588,-2.0378,-.25,7.2284,-5.3378,-.25,7.2284],
// 3 72 -3.8097 -.25 2.3102 -2.3212 -.25 6.6588 -5.6212 -.25 6.6588
  [3,72,-3.8097,-.25,2.3102,-2.3212,-.25,6.6588,-5.6212,-.25,6.6588],
// 4 72 .0788 -.25 6.6588 2.5788 -.25 6.6588 2.8622 -.25 7.2284 .3622 -.25 7.2284
  [4,72,.0788,-.25,6.6588,2.5788,-.25,6.6588,2.8622,-.25,7.2284,.3622,-.25,7.2284],
// 3 72 1.0903 -.25 2.3102 2.5788 -.25 6.6588 .0788 -.25 6.6588
  [3,72,1.0903,-.25,2.3102,2.5788,-.25,6.6588,.0788,-.25,6.6588],
// 4 72 4.9788 -.25 6.6588 7.4788 -.25 6.6588 7.7622 -.25 7.2284 5.2622 -.25 7.2284
  [4,72,4.9788,-.25,6.6588,7.4788,-.25,6.6588,7.7622,-.25,7.2284,5.2622,-.25,7.2284],
// 3 72 5.9903 -.25 2.3102 7.4788 -.25 6.6588 4.9788 -.25 6.6588
  [3,72,5.9903,-.25,2.3102,7.4788,-.25,6.6588,4.9788,-.25,6.6588],
// 0 // Grey faces
// 3 71 -7.1097 -.25 2.3102 -3.8097 -.25 2.3102 -5.6212 -.25 6.6588
  [3,71,-7.1097,-.25,2.3102,-3.8097,-.25,2.3102,-5.6212,-.25,6.6588],
// 4 71 -7.1097 -.25 2.3102 -7.5754 -.25 -.0128 -4.2754 -.25 -.0128 -3.8097 -.25 2.3102
  [4,71,-7.1097,-.25,2.3102,-7.5754,-.25,-.0128,-4.2754,-.25,-.0128,-3.8097,-.25,2.3102],
// 3 71 -1.4097 -.25 2.3102 1.0903 -.25 2.3102 .0788 -.25 6.6588
  [3,71,-1.4097,-.25,2.3102,1.0903,-.25,2.3102,.0788,-.25,6.6588],
// 4 71 -1.4097 -.25 2.3102 -1.8754 -.25 -.0128 .6246 -.25 -.0128 1.0903 -.25 2.3102
  [4,71,-1.4097,-.25,2.3102,-1.8754,-.25,-.0128,.6246,-.25,-.0128,1.0903,-.25,2.3102],
// 3 71 3.4903 -.25 2.3102 5.9903 -.25 2.3102 4.9788 -.25 6.6588
  [3,71,3.4903,-.25,2.3102,5.9903,-.25,2.3102,4.9788,-.25,6.6588],
// 4 71 3.4903 -.25 2.3102 3.0246 -.25 -.0128 5.5246 -.25 -.0128 5.9903 -.25 2.3102
  [4,71,3.4903,-.25,2.3102,3.0246,-.25,-.0128,5.5246,-.25,-.0128,5.9903,-.25,2.3102],
// 0 // Silver faces
// 4 80 -1.7212 -.25 6.6588 .0788 -.25 6.6588 .3622 -.25 7.2284 -1.4378 -.25 7.2284
  [4,80,-1.7212,-.25,6.6588,.0788,-.25,6.6588,.3622,-.25,7.2284,-1.4378,-.25,7.2284],
// 4 80 -1.7212 -.25 6.6588 -3.2097 -.25 2.3102 -1.4097 -.25 2.3102 .0788 -.25 6.6588
  [4,80,-1.7212,-.25,6.6588,-3.2097,-.25,2.3102,-1.4097,-.25,2.3102,.0788,-.25,6.6588],
// 4 80 -3.2097 -.25 2.3102 -3.6754 -.25 -.0128 -1.8754 -.25 -.0128 -1.4097 -.25 2.3102
  [4,80,-3.2097,-.25,2.3102,-3.6754,-.25,-.0128,-1.8754,-.25,-.0128,-1.4097,-.25,2.3102],
// 4 80 3.1788 -.25 6.6588 4.9788 -.25 6.6588 5.2622 -.25 7.2284 3.4622 -.25 7.2284
  [4,80,3.1788,-.25,6.6588,4.9788,-.25,6.6588,5.2622,-.25,7.2284,3.4622,-.25,7.2284],
// 4 80 3.1788 -.25 6.6588 1.6903 -.25 2.3102 3.4903 -.25 2.3102 4.9788 -.25 6.6588
  [4,80,3.1788,-.25,6.6588,1.6903,-.25,2.3102,3.4903,-.25,2.3102,4.9788,-.25,6.6588],
// 4 80 1.6903 -.25 2.3102 1.2246 -.25 -.0128 3.0246 -.25 -.0128 3.4903 -.25 2.3102
  [4,80,1.6903,-.25,2.3102,1.2246,-.25,-.0128,3.0246,-.25,-.0128,3.4903,-.25,2.3102],
// 4 80 8.0788 -.25 6.6588 9.8788 -.25 6.6588 10.1622 -.25 7.2284 8.3622 -.25 7.2284
  [4,80,8.0788,-.25,6.6588,9.8788,-.25,6.6588,10.1622,-.25,7.2284,8.3622,-.25,7.2284],
// 4 80 8.0788 -.25 6.6588 6.5903 -.25 2.3102 8.3903 -.25 2.3102 9.8788 -.25 6.6588
  [4,80,8.0788,-.25,6.6588,6.5903,-.25,2.3102,8.3903,-.25,2.3102,9.8788,-.25,6.6588],
// 4 80 6.5903 -.25 2.3102 6.1246 -.25 -.0128 7.9246 -.25 -.0128 8.3903 -.25 2.3102
  [4,80,6.5903,-.25,2.3102,6.1246,-.25,-.0128,7.9246,-.25,-.0128,8.3903,-.25,2.3102],
];
module ldraw_lib__s__6142617ss03(step=0, col=false, unit=2/5, alt=false, line=0.2, solid=!$preview)
    makepoly(ldraw_lib__s__6142617ss03(), step=step, col=col, unit=unit, alt=alt, line=line, solid=solid);
ldraw_lib__s__6142617ss03(line=0.2);
// file: s/6142617ss02.scad
use <../../lib.scad>
function ldraw_lib__s__6142617ss02() = [
// 0 ~Sticker  1.9 x  1.8 with Silver Air Vents on Black Background Left - Second Face
// 0 Name: s\6142617ss02.dat
// 0 Author: Massimo Maso [Sirio]
// 0 !LDRAW_ORG Subpart UPDATE 2023-05
// 0 !LICENSE Licensed under CC BY 4.0 : see CAreadme.txt
// 
// 0 BFC CERTIFY CCW
  [0,"BFC","CERTIFY"],
  [0,"BFC","CCW"],
// 
// 0 !HISTORY 2023-10-31 [OrionP] Official Update 2023-05
// 
// 
// 0 // Black faces
// 4 0 -3.5738 -.25 -3.798 -18 -.25 .0121 -18 -.25 -7.3435 -5.3378 -.25 -7.3435
  [4,0,-3.5738,-.25,-3.798,-18,-.25,.0121,-18,-.25,-7.3435,-5.3378,-.25,-7.3435],
// 3 0 -3.5738 -.25 -3.798 -2.75 -.25 .0121 -18 -.25 .0121
  [3,0,-3.5738,-.25,-3.798,-2.75,-.25,.0121,-18,-.25,.0121],
// 3 0 -3.5738 -.25 -3.798 -1.0028 -.25 .0121 -2.75 -.25 .0121
  [3,0,-3.5738,-.25,-3.798,-1.0028,-.25,.0121,-2.75,-.25,.0121],
// 4 0 -.2738 -.25 -3.798 .3262 -.25 -3.798 2.8972 -.25 .0121 2.2972 -.25 .0121
  [4,0,-.2738,-.25,-3.798,.3262,-.25,-3.798,2.8972,-.25,.0121,2.2972,-.25,.0121],
// 4 0 -.2738 -.25 -3.798 -2.0378 -.25 -7.3435 -1.4378 -.25 -7.3435 .3262 -.25 -3.798
  [4,0,-.2738,-.25,-3.798,-2.0378,-.25,-7.3435,-1.4378,-.25,-7.3435,.3262,-.25,-3.798],
// 4 0 4.6262 -.25 -3.798 5.2262 -.25 -3.798 7.7972 -.25 .0121 7.1972 -.25 .0121
  [4,0,4.6262,-.25,-3.798,5.2262,-.25,-3.798,7.7972,-.25,.0121,7.1972,-.25,.0121],
// 4 0 4.6262 -.25 -3.798 2.8622 -.25 -7.3435 3.4622 -.25 -7.3435 5.2262 -.25 -3.798
  [4,0,4.6262,-.25,-3.798,2.8622,-.25,-7.3435,3.4622,-.25,-7.3435,5.2262,-.25,-3.798],
// 4 0 9.5262 -.25 -3.798 10.1262 -.25 -3.798 12.6972 -.25 .0121 12.0972 -.25 .0121
  [4,0,9.5262,-.25,-3.798,10.1262,-.25,-3.798,12.6972,-.25,.0121,12.0972,-.25,.0121],
// 4 0 9.5262 -.25 -3.798 7.7622 -.25 -7.3435 8.3622 -.25 -7.3435 10.1262 -.25 -3.798
  [4,0,9.5262,-.25,-3.798,7.7622,-.25,-7.3435,8.3622,-.25,-7.3435,10.1262,-.25,-3.798],
// 4 0 11.9262 -.25 -3.798 18 -.25 -7.3435 18 -.25 .0121 14.4972 -.25 .0121
  [4,0,11.9262,-.25,-3.798,18,-.25,-7.3435,18,-.25,.0121,14.4972,-.25,.0121],
// 3 0 11.9262 -.25 -3.798 10.1622 -.25 -7.3435 18 -.25 -7.3435
  [3,0,11.9262,-.25,-3.798,10.1622,-.25,-7.3435,18,-.25,-7.3435],
// 0 // Dark grey faces
// 4 72 -3.5738 -.25 -3.798 -.2738 -.25 -3.798 2.2972 -.25 .0121 -1.0028 -.25 .0121
  [4,72,-3.5738,-.25,-3.798,-.2738,-.25,-3.798,2.2972,-.25,.0121,-1.0028,-.25,.0121],
// 4 72 -3.5738 -.25 -3.798 -5.3378 -.25 -7.3435 -2.0378 -.25 -7.3435 -.2738 -.25 -3.798
  [4,72,-3.5738,-.25,-3.798,-5.3378,-.25,-7.3435,-2.0378,-.25,-7.3435,-.2738,-.25,-3.798],
// 4 72 2.1262 -.25 -3.798 4.6262 -.25 -3.798 7.1972 -.25 .0121 4.6972 -.25 .0121
  [4,72,2.1262,-.25,-3.798,4.6262,-.25,-3.798,7.1972,-.25,.0121,4.6972,-.25,.0121],
// 4 72 2.1262 -.25 -3.798 .3622 -.25 -7.3435 2.8622 -.25 -7.3435 4.6262 -.25 -3.798
  [4,72,2.1262,-.25,-3.798,.3622,-.25,-7.3435,2.8622,-.25,-7.3435,4.6262,-.25,-3.798],
// 4 72 7.0262 -.25 -3.798 9.5262 -.25 -3.798 12.0972 -.25 .0121 9.5972 -.25 .0121
  [4,72,7.0262,-.25,-3.798,9.5262,-.25,-3.798,12.0972,-.25,.0121,9.5972,-.25,.0121],
// 4 72 7.0262 -.25 -3.798 5.2622 -.25 -7.3435 7.7622 -.25 -7.3435 9.5262 -.25 -3.798
  [4,72,7.0262,-.25,-3.798,5.2622,-.25,-7.3435,7.7622,-.25,-7.3435,9.5262,-.25,-3.798],
// 0 // Silver faces
// 4 80 .3262 -.25 -3.798 2.1262 -.25 -3.798 4.6972 -.25 .0121 2.8972 -.25 .0121
  [4,80,.3262,-.25,-3.798,2.1262,-.25,-3.798,4.6972,-.25,.0121,2.8972,-.25,.0121],
// 4 80 .3262 -.25 -3.798 -1.4378 -.25 -7.3435 .3622 -.25 -7.3435 2.1262 -.25 -3.798
  [4,80,.3262,-.25,-3.798,-1.4378,-.25,-7.3435,.3622,-.25,-7.3435,2.1262,-.25,-3.798],
// 4 80 5.2262 -.25 -3.798 7.0262 -.25 -3.798 9.5972 -.25 .0121 7.7972 -.25 .0121
  [4,80,5.2262,-.25,-3.798,7.0262,-.25,-3.798,9.5972,-.25,.0121,7.7972,-.25,.0121],
// 4 80 5.2262 -.25 -3.798 3.4622 -.25 -7.3435 5.2622 -.25 -7.3435 7.0262 -.25 -3.798
  [4,80,5.2262,-.25,-3.798,3.4622,-.25,-7.3435,5.2622,-.25,-7.3435,7.0262,-.25,-3.798],
// 4 80 10.1262 -.25 -3.798 11.9262 -.25 -3.798 14.4972 -.25 .0121 12.6972 -.25 .0121
  [4,80,10.1262,-.25,-3.798,11.9262,-.25,-3.798,14.4972,-.25,.0121,12.6972,-.25,.0121],
// 4 80 10.1262 -.25 -3.798 8.3622 -.25 -7.3435 10.1622 -.25 -7.3435 11.9262 -.25 -3.798
  [4,80,10.1262,-.25,-3.798,8.3622,-.25,-7.3435,10.1622,-.25,-7.3435,11.9262,-.25,-3.798],
];
module ldraw_lib__s__6142617ss02(step=0, col=false, unit=2/5, alt=false, line=0.2, solid=!$preview)
    makepoly(ldraw_lib__s__6142617ss02(), step=step, col=col, unit=unit, alt=alt, line=line, solid=solid);
ldraw_lib__s__6142617ss02(line=0.2);
// file: s/6142617ss01.scad
use <../../lib.scad>
use <../../p/1-4chrd.scad>
function ldraw_lib__s__6142617ss01() = [
// 0 ~Sticker  1.9 x  1.8 with Silver Air Vents on Black Background Left - First Face
// 0 Name: s\6142617ss01.dat
// 0 Author: Massimo Maso [Sirio]
// 0 !LDRAW_ORG Subpart UPDATE 2023-05
// 0 !LICENSE Licensed under CC BY 4.0 : see CAreadme.txt
// 
// 0 BFC CERTIFY CCW
  [0,"BFC","CERTIFY"],
  [0,"BFC","CCW"],
// 
// 0 !HISTORY 2023-10-31 [OrionP] Official Update 2023-05
// 
// 
// 0 // Primitives
// 1 0 -16.5 -.25 3.8922 -1.5 0 0 0 1 0 0 0 1.5 1-4chrd.dat
  [1,0,-16.5,-.25,3.8922,-1.5,0,0,0,1,0,0,0,1.5, ldraw_lib__1_4chrd()],
// 1 0 16.5 -.25 3.8922 1.5 0 0 0 1 0 0 0 1.5 1-4chrd.dat
  [1,0,16.5,-.25,3.8922,1.5,0,0,0,1,0,0,0,1.5, ldraw_lib__1_4chrd()],
// 0 // Black faces
// 4 0 -18 -.25 3.8922 18 -.25 3.8922 16.5 -.25 5.3922 -16.5 -.25 5.3922
  [4,0,-18,-.25,3.8922,18,-.25,3.8922,16.5,-.25,5.3922,-16.5,-.25,5.3922],
// 4 0 -18 -.25 3.8922 -18 -.25 -.0121 -2.75 -.25 -.0121 -2.75 -.25 .6211
  [4,0,-18,-.25,3.8922,-18,-.25,-.0121,-2.75,-.25,-.0121,-2.75,-.25,.6211],
// 4 0 18 -.25 3.8922 -18 -.25 3.8922 -2.75 -.25 .6211 15 -.25 .6211
  [4,0,18,-.25,3.8922,-18,-.25,3.8922,-2.75,-.25,.6211,15,-.25,.6211],
// 4 0 18 -.25 3.8922 15 -.25 .6211 14.4972 -.25 -.0121 18 -.25 -.0121
  [4,0,18,-.25,3.8922,15,-.25,.6211,14.4972,-.25,-.0121,18,-.25,-.0121],
// 0 // Silver faces
// 3 80 -2.75 -.25 .6211 -2.75 -.25 -.0121 -1.0028 -.25 -.0121
  [3,80,-2.75,-.25,.6211,-2.75,-.25,-.0121,-1.0028,-.25,-.0121],
// 3 80 -2.75 -.25 .6211 -1.0028 -.25 -.0121 2.2972 -.25 -.0121
  [3,80,-2.75,-.25,.6211,-1.0028,-.25,-.0121,2.2972,-.25,-.0121],
// 3 80 -2.75 -.25 .6211 2.2972 -.25 -.0121 2.8972 -.25 -.0121
  [3,80,-2.75,-.25,.6211,2.2972,-.25,-.0121,2.8972,-.25,-.0121],
// 3 80 -2.75 -.25 .6211 2.8972 -.25 -.0121 4.6972 -.25 -.0121
  [3,80,-2.75,-.25,.6211,2.8972,-.25,-.0121,4.6972,-.25,-.0121],
// 3 80 -2.75 -.25 .6211 4.6972 -.25 -.0121 7.1972 -.25 -.0121
  [3,80,-2.75,-.25,.6211,4.6972,-.25,-.0121,7.1972,-.25,-.0121],
// 4 80 -2.75 -.25 .6211 7.1972 -.25 -.0121 7.7972 -.25 -.0121 15 -.25 .6211
  [4,80,-2.75,-.25,.6211,7.1972,-.25,-.0121,7.7972,-.25,-.0121,15,-.25,.6211],
// 3 80 15 -.25 .6211 7.7972 -.25 -.0121 9.5972 -.25 -.0121
  [3,80,15,-.25,.6211,7.7972,-.25,-.0121,9.5972,-.25,-.0121],
// 3 80 15 -.25 .6211 9.5972 -.25 -.0121 12.0972 -.25 -.0121
  [3,80,15,-.25,.6211,9.5972,-.25,-.0121,12.0972,-.25,-.0121],
// 3 80 15 -.25 .6211 12.0972 -.25 -.0121 12.6972 -.25 -.0121
  [3,80,15,-.25,.6211,12.0972,-.25,-.0121,12.6972,-.25,-.0121],
// 3 80 15 -.25 .6211 12.6972 -.25 -.0121 14.4972 -.25 -.0121
  [3,80,15,-.25,.6211,12.6972,-.25,-.0121,14.4972,-.25,-.0121],
];
module ldraw_lib__s__6142617ss01(step=0, col=false, unit=2/5, alt=false, line=0.2, solid=!$preview)
    makepoly(ldraw_lib__s__6142617ss01(), step=step, col=col, unit=unit, alt=alt, line=line, solid=solid);
ldraw_lib__s__6142617ss01(line=0.2);
// main file
use <../lib.scad>
use <s/6142617ss01.scad>
use <s/6142617ss02.scad>
use <s/6142617ss03.scad>
use <s/6142617ss04.scad>
use <s/6142617ss05.scad>
use <s/6142617ss06.scad>
use <s/6142617ss07.scad>
function ldraw_lib__6142617s() = [
// 0 Sticker  1.9 x  1.8 with Silver Air Vents on Black Background Left (Needs work)
// 0 Name: 6142617s.dat
// 0 Author: Massimo Maso [Sirio]
// 0 !LDRAW_ORG Part UPDATE 2023-05
// 0 !LICENSE Licensed under CC BY 4.0 : see CAreadme.txt
// 
// 0 !HELP Needs work: Some parts should be halftones.
// 0 !HELP The transition from dark grey to grey should be done less clearly.
// 
// 0 BFC CERTIFY CCW
  [0,"BFC","CERTIFY"],
  [0,"BFC","CCW"],
// 
// 0 !KEYWORDS 1969, Camaro, Chevrolet, Drag, Race, Set 75874, Speed Champions
// 0 !KEYWORDS Z/28
// 
// 0 !HISTORY 2023-10-31 [OrionP] Official Update 2023-05
// 
// 
// 1 16 0 0 13.8789 1 0 0 0 1 0 0 0 1 s\6142617ss01.dat
  [1,16,0,0,13.8789,1,0,0,0,1,0,0,0,1, ldraw_lib__s__6142617ss01()],
// 1 16 0 0 13.8547 1 0 0 0 1 0 0 0 1 s\6142617ss02.dat
  [1,16,0,0,13.8547,1,0,0,0,1,0,0,0,1, ldraw_lib__s__6142617ss02()],
// 1 16 0 0 -.7172 1 0 0 0 1 0 0 0 1 s\6142617ss03.dat
  [1,16,0,0,-.7172,1,0,0,0,1,0,0,0,1, ldraw_lib__s__6142617ss03()],
// 1 16 0 0 -.7428 1 0 0 0 1 0 0 0 1 s\6142617ss04.dat
  [1,16,0,0,-.7428,1,0,0,0,1,0,0,0,1, ldraw_lib__s__6142617ss04()],
// 1 16 0 0 -14.6522 1 0 0 0 1 0 0 0 1 s\6142617ss05.dat
  [1,16,0,0,-14.6522,1,0,0,0,1,0,0,0,1, ldraw_lib__s__6142617ss05()],
// 1 16 0 0 -14.681 1 0 0 0 1 0 0 0 1 s\6142617ss06.dat
  [1,16,0,0,-14.681,1,0,0,0,1,0,0,0,1, ldraw_lib__s__6142617ss06()],
// 1 16 0 0 0 1 0 0 0 1 0 0 0 1 s\6142617ss07.dat
  [1,16,0,0,0,1,0,0,0,1,0,0,0,1, ldraw_lib__s__6142617ss07()],
];
module ldraw_lib__6142617s(step=0, col=false, unit=2/5, alt=false, line=0.2, solid=!$preview)
    makepoly(ldraw_lib__6142617s(), step=step, col=col, unit=unit, alt=alt, line=line, solid=solid);
ldraw_lib__6142617s(line=0.2);
